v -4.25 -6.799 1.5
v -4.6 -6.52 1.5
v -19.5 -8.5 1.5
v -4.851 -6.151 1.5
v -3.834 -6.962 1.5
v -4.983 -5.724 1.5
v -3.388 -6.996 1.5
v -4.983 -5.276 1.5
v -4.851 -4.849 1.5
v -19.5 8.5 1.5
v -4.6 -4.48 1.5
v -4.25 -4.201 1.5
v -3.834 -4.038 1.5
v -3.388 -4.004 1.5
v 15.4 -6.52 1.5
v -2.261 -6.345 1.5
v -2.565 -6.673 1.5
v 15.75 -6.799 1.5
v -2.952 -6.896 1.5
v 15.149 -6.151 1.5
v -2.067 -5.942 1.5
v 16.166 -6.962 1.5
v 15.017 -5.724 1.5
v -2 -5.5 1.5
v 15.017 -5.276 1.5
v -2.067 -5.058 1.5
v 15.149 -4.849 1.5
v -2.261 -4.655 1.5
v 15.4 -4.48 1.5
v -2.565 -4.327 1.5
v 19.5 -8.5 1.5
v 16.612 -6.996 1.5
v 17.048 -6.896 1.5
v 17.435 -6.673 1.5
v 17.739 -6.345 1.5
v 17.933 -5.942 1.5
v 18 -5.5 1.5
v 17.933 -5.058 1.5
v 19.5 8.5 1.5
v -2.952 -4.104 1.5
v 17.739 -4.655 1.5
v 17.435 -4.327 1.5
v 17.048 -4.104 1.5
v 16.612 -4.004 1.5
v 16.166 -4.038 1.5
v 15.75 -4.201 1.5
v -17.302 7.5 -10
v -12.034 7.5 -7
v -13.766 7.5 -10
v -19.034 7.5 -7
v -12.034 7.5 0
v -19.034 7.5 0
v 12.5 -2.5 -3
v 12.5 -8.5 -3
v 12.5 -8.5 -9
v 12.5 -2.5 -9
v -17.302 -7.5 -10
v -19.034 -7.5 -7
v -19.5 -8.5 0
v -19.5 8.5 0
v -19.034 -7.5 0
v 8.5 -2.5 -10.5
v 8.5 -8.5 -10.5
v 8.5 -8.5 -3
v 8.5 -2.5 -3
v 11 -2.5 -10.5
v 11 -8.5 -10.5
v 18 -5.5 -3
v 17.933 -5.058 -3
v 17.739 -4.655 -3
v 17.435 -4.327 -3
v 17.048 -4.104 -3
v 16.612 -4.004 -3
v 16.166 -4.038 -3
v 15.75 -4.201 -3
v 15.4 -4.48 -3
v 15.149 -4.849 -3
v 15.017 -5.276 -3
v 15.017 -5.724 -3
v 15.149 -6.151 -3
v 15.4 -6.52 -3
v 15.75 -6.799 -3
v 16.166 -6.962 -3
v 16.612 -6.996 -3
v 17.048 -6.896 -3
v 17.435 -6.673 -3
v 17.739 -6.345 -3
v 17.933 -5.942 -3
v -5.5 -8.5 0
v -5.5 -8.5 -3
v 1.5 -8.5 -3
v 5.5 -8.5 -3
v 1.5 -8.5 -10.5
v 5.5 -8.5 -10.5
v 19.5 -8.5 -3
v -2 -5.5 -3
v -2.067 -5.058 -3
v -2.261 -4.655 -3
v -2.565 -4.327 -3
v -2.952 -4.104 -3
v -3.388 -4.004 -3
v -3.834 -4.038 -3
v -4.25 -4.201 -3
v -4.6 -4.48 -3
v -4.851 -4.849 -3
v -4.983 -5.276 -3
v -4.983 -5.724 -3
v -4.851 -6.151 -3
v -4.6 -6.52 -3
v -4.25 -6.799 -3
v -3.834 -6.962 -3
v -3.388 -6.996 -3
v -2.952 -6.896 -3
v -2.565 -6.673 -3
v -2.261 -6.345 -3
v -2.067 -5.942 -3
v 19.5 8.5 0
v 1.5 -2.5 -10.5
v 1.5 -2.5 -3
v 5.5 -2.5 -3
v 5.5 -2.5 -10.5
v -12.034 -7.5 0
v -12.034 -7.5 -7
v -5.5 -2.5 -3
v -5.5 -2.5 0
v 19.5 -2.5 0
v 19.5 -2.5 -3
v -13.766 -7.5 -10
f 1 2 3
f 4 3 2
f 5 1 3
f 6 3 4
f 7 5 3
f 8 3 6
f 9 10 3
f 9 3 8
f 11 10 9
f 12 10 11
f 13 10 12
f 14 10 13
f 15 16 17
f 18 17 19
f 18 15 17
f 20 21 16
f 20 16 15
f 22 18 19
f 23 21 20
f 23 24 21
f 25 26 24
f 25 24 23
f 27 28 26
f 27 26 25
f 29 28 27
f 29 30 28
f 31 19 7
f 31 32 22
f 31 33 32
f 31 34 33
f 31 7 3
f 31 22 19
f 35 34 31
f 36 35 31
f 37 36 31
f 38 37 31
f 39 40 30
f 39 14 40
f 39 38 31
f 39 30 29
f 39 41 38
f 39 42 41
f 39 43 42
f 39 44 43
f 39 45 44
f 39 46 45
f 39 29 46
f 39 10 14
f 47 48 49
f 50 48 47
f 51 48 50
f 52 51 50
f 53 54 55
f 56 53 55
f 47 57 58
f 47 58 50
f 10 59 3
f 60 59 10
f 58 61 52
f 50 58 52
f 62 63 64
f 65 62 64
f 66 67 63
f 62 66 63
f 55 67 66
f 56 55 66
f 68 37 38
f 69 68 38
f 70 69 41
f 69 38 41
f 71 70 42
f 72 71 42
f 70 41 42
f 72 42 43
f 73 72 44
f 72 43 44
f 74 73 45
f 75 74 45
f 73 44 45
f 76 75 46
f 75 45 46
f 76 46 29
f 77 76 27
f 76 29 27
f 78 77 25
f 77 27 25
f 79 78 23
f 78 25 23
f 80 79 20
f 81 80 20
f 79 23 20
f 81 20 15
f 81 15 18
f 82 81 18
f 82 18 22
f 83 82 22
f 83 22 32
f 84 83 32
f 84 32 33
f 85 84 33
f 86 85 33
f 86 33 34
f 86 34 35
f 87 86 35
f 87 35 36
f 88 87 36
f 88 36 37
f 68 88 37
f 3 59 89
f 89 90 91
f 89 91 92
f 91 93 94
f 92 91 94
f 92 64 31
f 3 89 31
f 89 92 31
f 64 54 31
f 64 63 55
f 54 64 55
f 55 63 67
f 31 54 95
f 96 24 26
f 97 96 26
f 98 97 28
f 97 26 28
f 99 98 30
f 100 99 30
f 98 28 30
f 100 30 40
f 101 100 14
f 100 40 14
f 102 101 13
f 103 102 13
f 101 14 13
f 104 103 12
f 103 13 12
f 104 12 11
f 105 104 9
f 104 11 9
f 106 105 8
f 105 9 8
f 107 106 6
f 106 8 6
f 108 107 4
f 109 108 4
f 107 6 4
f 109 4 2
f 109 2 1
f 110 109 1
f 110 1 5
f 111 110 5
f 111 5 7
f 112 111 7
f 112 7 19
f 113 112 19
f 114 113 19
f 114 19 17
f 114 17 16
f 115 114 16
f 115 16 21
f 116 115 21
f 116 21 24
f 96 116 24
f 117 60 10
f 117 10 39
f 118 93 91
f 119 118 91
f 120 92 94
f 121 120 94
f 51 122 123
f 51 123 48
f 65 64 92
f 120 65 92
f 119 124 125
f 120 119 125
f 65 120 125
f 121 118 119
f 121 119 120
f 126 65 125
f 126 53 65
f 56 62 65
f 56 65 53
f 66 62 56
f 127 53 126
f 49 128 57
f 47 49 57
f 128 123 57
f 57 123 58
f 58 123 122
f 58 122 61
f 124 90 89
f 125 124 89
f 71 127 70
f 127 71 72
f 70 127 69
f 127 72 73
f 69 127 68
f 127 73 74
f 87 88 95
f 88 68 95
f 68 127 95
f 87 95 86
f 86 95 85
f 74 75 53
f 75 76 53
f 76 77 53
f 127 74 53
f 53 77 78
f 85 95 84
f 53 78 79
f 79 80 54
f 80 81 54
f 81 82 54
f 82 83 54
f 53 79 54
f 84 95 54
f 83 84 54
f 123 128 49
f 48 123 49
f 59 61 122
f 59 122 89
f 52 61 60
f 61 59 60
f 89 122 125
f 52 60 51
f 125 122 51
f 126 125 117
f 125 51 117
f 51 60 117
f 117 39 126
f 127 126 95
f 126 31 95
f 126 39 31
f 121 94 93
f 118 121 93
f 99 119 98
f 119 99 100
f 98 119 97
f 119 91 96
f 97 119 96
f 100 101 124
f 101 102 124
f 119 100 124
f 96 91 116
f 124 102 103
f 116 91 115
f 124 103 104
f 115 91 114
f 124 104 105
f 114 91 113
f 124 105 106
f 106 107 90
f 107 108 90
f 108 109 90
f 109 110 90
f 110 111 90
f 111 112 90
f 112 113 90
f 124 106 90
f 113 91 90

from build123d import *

# Parameters (mm, degrees)
ESQUISSE1_W             = 39
ESQUISSE1_H             = 17
BOSS_EXTRU_1_DEPTH      = 1.5
BOSS_EXTRU_2_DEPTH      = 6
ESQUISSE2_R             = 1.5
ENL_V_MAT_EXTRU_1_DEPTH = 13
CHANFREIN1_SIZE         = 1.5
ESQUISSE4_W             = 7
ESQUISSE4_H             = 15
BOSS_EXTRU_3_DEPTH      = 10
CHANFREIN2_SIZE         = 3
CHANFREIN2_SIZE2        = 1.732050808
CHANFREIN2_PART_2_SIZE  = 3
CHANFREIN2_PART_2_SIZE2 = 1.732050808


with BuildPart() as part:
    # Esquisse1 → Boss.-Extru.1 (new body)
    with BuildSketch(Plane.XY):
        Rectangle(ESQUISSE1_W, ESQUISSE1_H)
    extrude(amount=BOSS_EXTRU_1_DEPTH)

    # Esquisse3 → Boss.-Extru.2 (add)
    with BuildSketch(Plane(origin=(0, -8.5, 0), x_dir=(1, 0, 0), z_dir=(0, 1, 0))):
        Polygon((19.5, 0), (19.5, 3), (12.5, 3), (12.5, 10.5), (8.5, 10.5), (8.5, 3), (5.5, 3), (5.5, 10.5), (1.5, 10.5), (1.5, 3), (-5.5, 3), (-5.5, 0), align=None)
    extrude(amount=BOSS_EXTRU_2_DEPTH)

    # Esquisse2 → Enlèv. mat.-Extru.1 (cut, through all)
    with BuildSketch(Plane.XY.offset(1.5)):
        with Locations((16.5, -5.5)):
            Circle(ESQUISSE2_R)
        with Locations((-3.5, -5.5)):
            Circle(ESQUISSE2_R)
    extrude(amount=-ENL_V_MAT_EXTRU_1_DEPTH, mode=Mode.SUBTRACT)

    # Chanfrein1
    chanfrein1_edges = [part.edges().sort_by_distance(p)[0] for p in [
        (12.5, -5.5, -10.5),
    ]]
    chamfer(chanfrein1_edges, length=CHANFREIN1_SIZE)

    # Esquisse4 → Boss.-Extru.3 (add)
    with BuildSketch(Plane(origin=(0, 0, 0), x_dir=(-1, 0, 0), z_dir=(0, 0, -1))):
        with Locations((15.534193906, 0)):
            Rectangle(ESQUISSE4_W, ESQUISSE4_H)
    extrude(amount=BOSS_EXTRU_3_DEPTH)

    # Chanfrein2
    chanfrein2_edges = [part.edges().sort_by_distance(p)[0] for p in [
        (-12.034193906, 0, -10),
    ]]
    chanfrein2_side = [part.faces().sort_by_distance(p)[0] for p in [
        (-12.034193906, 0, -5),
    ]]
    chamfer(chanfrein2_edges, length=CHANFREIN2_SIZE, length2=CHANFREIN2_SIZE2, reference=chanfrein2_side[0])

    # Chanfrein2 part 2
    chanfrein2_part_2_edges = [part.edges().sort_by_distance(p)[0] for p in [
        (-19.034193906, 0, -10),
    ]]
    chanfrein2_part_2_side = [part.faces().sort_by_distance(p)[0] for p in [
        (-19.034193906, 0, -5),
    ]]
    chamfer(chanfrein2_part_2_edges, length=CHANFREIN2_PART_2_SIZE, length2=CHANFREIN2_PART_2_SIZE2, reference=chanfrein2_part_2_side[0])


solid = part.part
